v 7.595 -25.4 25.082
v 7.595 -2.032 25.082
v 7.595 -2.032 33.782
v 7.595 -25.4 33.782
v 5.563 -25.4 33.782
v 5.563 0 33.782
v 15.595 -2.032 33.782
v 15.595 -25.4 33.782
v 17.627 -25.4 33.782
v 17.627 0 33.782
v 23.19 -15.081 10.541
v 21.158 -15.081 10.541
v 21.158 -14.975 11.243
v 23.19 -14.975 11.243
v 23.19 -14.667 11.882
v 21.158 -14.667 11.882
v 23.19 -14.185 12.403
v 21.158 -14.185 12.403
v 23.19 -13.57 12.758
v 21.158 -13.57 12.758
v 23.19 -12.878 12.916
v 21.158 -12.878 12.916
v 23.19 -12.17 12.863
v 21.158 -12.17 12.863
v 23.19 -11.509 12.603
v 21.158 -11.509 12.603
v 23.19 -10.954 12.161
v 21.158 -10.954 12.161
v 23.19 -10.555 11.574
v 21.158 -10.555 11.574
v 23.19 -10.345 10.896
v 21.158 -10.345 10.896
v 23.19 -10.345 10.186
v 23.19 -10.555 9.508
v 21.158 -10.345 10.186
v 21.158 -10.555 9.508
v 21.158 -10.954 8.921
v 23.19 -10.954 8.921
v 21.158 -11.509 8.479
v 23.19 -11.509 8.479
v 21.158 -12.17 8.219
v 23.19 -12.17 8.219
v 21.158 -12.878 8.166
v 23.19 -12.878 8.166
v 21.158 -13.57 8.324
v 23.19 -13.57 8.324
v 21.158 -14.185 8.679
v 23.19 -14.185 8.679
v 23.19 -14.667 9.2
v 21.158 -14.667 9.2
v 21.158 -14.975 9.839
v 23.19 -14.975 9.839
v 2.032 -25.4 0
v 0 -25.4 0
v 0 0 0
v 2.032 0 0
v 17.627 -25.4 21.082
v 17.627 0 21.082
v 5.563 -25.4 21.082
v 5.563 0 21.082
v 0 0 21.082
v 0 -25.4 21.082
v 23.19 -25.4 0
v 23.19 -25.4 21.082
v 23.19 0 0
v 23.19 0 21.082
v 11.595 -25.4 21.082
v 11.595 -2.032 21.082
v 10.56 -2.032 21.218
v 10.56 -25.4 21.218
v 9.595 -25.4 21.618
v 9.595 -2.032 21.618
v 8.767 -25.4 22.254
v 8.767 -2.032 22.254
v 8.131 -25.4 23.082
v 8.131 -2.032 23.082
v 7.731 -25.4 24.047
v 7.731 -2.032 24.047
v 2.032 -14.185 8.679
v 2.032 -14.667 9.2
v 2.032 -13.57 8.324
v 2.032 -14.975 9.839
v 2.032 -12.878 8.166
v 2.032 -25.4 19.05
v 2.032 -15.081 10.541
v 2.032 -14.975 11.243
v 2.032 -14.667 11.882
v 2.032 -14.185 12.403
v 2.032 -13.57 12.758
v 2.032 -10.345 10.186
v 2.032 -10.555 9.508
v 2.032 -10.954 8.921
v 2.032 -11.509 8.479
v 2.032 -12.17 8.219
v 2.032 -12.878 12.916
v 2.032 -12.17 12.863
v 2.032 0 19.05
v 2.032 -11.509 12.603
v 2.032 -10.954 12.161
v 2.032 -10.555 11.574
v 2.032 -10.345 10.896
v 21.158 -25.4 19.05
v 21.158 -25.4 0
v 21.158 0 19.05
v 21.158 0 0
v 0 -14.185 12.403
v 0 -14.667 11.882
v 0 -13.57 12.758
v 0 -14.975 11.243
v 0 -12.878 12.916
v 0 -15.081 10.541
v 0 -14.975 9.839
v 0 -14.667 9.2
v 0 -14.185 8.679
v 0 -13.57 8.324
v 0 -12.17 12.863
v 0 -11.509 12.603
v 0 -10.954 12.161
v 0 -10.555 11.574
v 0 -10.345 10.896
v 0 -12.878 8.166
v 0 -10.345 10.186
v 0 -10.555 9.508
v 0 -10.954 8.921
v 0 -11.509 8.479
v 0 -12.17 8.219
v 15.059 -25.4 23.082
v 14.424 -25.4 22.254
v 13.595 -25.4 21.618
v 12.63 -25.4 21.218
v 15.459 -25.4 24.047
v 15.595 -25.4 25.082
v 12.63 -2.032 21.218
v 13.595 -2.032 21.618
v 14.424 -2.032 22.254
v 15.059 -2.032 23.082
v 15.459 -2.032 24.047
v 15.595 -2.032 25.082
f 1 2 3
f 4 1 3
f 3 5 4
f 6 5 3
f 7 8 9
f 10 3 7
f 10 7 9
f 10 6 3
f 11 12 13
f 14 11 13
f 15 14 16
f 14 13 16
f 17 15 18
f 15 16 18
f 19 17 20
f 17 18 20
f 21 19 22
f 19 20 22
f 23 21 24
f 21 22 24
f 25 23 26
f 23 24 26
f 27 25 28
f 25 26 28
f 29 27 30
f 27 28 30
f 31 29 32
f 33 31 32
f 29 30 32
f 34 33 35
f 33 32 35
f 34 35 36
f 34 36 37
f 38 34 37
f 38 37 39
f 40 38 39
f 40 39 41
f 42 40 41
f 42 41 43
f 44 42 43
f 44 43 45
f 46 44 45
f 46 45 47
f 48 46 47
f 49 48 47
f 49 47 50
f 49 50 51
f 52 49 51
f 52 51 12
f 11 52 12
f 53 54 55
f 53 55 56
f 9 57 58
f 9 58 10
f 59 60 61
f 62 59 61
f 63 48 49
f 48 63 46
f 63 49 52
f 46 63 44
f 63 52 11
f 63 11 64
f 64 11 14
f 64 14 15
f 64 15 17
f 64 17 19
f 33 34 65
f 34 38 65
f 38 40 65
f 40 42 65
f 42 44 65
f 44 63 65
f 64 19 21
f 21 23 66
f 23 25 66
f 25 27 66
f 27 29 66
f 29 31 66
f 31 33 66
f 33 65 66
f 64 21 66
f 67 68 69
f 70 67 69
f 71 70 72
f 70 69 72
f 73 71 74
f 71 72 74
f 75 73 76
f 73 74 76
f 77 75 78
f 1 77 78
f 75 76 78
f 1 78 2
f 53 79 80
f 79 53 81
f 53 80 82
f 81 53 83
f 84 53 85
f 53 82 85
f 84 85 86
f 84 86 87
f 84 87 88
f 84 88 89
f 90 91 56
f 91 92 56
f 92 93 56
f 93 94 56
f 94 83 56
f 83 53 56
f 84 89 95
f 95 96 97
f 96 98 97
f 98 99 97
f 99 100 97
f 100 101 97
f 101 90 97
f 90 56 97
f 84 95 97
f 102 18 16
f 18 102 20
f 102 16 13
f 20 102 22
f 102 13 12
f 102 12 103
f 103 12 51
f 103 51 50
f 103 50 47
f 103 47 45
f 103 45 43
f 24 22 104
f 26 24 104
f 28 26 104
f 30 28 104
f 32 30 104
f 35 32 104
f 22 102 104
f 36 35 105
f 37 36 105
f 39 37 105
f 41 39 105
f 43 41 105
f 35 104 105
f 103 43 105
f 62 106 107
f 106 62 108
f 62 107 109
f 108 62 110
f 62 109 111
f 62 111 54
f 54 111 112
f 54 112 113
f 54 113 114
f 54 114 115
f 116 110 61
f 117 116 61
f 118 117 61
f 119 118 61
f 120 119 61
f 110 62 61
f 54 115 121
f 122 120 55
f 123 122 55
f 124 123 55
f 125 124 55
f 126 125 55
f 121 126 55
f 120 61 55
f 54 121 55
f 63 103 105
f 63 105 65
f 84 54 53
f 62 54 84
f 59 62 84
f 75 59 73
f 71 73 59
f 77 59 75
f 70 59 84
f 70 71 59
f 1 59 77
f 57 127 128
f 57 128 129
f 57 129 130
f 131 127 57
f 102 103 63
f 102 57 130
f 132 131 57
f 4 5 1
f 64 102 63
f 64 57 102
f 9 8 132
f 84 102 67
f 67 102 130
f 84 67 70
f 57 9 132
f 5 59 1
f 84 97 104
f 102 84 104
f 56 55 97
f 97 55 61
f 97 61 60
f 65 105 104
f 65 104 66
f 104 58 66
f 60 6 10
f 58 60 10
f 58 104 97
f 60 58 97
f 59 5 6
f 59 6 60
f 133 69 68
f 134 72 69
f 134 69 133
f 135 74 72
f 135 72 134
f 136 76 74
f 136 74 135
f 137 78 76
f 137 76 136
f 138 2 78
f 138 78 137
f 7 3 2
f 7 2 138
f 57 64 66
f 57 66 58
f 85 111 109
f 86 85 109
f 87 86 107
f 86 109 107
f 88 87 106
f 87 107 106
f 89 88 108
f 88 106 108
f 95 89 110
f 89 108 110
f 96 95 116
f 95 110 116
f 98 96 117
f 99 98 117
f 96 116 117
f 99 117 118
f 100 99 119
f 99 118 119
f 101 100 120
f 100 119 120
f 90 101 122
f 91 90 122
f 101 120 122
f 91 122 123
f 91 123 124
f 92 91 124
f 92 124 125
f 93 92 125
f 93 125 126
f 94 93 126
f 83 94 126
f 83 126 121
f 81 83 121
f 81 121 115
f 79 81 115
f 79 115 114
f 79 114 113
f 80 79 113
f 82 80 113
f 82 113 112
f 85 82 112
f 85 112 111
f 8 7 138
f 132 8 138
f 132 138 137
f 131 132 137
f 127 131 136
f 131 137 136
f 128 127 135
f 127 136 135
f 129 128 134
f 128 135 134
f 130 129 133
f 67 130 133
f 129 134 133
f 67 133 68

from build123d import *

# Parameters (mm, degrees)
F1_DEPTH = 25.4
F0_W     = 8
F0_H     = 8.7
F2_DEPTH = 2.032
F4_D     = 4.7625


with BuildPart() as f1:
    # F0 (on Front) → F1 (new body)
    with BuildSketch(Plane.XZ):
        Polygon((0, 21.082), (0, 0), (2.032, 0), (2.032, 19.05), (21.1582, 19.05), (21.1582, 0), (23.1902, 0), (23.1902, 21.082), (17.6271, 21.082), (11.5951, 21.082), (5.5631, 21.082), align=None)
        with BuildLine():
            ThreePointArc((15.5951, 25.082), (14.423527, 22.253573), (11.5951, 21.082))
            Line((11.5951, 21.082), (17.6271, 21.082))
            Line((17.6271, 21.082), (17.6271, 33.782))
            Line((17.6271, 33.782), (15.5951, 33.782))
            Line((15.5951, 33.782), (15.5951, 25.082))
        make_face()
        with BuildLine():
            Line((5.5631, 33.782), (5.5631, 21.082))
            Line((5.5631, 21.082), (11.5951, 21.082))
            ThreePointArc((11.5951, 21.082), (8.766673, 22.253573), (7.5951, 25.082))
            Line((7.5951, 25.082), (7.5951, 33.782))
            Line((7.5951, 33.782), (5.5631, 33.782))
        make_face()
    extrude(amount=F1_DEPTH)

    # F0 (on Front) → F2 (join)
    with BuildSketch(Plane.XZ):
        with BuildLine():
            ThreePointArc((7.5951, 25.082), (8.766673, 22.253573), (11.5951, 21.082))
            ThreePointArc((11.5951, 21.082), (14.423527, 22.253573), (15.5951, 25.082))
            Line((15.5951, 25.082), (7.5951, 25.082))
        make_face()
        with Locations((11.5951, 29.432)):
            Rectangle(F0_W, F0_H)
    extrude(amount=F2_DEPTH)

    # F4 (through all)
    with Locations(Plane.YZ.offset(23.1902)):
        with Locations((-12.7, 10.541)):
            Hole(F4_D / 2)


solid = f1.part
